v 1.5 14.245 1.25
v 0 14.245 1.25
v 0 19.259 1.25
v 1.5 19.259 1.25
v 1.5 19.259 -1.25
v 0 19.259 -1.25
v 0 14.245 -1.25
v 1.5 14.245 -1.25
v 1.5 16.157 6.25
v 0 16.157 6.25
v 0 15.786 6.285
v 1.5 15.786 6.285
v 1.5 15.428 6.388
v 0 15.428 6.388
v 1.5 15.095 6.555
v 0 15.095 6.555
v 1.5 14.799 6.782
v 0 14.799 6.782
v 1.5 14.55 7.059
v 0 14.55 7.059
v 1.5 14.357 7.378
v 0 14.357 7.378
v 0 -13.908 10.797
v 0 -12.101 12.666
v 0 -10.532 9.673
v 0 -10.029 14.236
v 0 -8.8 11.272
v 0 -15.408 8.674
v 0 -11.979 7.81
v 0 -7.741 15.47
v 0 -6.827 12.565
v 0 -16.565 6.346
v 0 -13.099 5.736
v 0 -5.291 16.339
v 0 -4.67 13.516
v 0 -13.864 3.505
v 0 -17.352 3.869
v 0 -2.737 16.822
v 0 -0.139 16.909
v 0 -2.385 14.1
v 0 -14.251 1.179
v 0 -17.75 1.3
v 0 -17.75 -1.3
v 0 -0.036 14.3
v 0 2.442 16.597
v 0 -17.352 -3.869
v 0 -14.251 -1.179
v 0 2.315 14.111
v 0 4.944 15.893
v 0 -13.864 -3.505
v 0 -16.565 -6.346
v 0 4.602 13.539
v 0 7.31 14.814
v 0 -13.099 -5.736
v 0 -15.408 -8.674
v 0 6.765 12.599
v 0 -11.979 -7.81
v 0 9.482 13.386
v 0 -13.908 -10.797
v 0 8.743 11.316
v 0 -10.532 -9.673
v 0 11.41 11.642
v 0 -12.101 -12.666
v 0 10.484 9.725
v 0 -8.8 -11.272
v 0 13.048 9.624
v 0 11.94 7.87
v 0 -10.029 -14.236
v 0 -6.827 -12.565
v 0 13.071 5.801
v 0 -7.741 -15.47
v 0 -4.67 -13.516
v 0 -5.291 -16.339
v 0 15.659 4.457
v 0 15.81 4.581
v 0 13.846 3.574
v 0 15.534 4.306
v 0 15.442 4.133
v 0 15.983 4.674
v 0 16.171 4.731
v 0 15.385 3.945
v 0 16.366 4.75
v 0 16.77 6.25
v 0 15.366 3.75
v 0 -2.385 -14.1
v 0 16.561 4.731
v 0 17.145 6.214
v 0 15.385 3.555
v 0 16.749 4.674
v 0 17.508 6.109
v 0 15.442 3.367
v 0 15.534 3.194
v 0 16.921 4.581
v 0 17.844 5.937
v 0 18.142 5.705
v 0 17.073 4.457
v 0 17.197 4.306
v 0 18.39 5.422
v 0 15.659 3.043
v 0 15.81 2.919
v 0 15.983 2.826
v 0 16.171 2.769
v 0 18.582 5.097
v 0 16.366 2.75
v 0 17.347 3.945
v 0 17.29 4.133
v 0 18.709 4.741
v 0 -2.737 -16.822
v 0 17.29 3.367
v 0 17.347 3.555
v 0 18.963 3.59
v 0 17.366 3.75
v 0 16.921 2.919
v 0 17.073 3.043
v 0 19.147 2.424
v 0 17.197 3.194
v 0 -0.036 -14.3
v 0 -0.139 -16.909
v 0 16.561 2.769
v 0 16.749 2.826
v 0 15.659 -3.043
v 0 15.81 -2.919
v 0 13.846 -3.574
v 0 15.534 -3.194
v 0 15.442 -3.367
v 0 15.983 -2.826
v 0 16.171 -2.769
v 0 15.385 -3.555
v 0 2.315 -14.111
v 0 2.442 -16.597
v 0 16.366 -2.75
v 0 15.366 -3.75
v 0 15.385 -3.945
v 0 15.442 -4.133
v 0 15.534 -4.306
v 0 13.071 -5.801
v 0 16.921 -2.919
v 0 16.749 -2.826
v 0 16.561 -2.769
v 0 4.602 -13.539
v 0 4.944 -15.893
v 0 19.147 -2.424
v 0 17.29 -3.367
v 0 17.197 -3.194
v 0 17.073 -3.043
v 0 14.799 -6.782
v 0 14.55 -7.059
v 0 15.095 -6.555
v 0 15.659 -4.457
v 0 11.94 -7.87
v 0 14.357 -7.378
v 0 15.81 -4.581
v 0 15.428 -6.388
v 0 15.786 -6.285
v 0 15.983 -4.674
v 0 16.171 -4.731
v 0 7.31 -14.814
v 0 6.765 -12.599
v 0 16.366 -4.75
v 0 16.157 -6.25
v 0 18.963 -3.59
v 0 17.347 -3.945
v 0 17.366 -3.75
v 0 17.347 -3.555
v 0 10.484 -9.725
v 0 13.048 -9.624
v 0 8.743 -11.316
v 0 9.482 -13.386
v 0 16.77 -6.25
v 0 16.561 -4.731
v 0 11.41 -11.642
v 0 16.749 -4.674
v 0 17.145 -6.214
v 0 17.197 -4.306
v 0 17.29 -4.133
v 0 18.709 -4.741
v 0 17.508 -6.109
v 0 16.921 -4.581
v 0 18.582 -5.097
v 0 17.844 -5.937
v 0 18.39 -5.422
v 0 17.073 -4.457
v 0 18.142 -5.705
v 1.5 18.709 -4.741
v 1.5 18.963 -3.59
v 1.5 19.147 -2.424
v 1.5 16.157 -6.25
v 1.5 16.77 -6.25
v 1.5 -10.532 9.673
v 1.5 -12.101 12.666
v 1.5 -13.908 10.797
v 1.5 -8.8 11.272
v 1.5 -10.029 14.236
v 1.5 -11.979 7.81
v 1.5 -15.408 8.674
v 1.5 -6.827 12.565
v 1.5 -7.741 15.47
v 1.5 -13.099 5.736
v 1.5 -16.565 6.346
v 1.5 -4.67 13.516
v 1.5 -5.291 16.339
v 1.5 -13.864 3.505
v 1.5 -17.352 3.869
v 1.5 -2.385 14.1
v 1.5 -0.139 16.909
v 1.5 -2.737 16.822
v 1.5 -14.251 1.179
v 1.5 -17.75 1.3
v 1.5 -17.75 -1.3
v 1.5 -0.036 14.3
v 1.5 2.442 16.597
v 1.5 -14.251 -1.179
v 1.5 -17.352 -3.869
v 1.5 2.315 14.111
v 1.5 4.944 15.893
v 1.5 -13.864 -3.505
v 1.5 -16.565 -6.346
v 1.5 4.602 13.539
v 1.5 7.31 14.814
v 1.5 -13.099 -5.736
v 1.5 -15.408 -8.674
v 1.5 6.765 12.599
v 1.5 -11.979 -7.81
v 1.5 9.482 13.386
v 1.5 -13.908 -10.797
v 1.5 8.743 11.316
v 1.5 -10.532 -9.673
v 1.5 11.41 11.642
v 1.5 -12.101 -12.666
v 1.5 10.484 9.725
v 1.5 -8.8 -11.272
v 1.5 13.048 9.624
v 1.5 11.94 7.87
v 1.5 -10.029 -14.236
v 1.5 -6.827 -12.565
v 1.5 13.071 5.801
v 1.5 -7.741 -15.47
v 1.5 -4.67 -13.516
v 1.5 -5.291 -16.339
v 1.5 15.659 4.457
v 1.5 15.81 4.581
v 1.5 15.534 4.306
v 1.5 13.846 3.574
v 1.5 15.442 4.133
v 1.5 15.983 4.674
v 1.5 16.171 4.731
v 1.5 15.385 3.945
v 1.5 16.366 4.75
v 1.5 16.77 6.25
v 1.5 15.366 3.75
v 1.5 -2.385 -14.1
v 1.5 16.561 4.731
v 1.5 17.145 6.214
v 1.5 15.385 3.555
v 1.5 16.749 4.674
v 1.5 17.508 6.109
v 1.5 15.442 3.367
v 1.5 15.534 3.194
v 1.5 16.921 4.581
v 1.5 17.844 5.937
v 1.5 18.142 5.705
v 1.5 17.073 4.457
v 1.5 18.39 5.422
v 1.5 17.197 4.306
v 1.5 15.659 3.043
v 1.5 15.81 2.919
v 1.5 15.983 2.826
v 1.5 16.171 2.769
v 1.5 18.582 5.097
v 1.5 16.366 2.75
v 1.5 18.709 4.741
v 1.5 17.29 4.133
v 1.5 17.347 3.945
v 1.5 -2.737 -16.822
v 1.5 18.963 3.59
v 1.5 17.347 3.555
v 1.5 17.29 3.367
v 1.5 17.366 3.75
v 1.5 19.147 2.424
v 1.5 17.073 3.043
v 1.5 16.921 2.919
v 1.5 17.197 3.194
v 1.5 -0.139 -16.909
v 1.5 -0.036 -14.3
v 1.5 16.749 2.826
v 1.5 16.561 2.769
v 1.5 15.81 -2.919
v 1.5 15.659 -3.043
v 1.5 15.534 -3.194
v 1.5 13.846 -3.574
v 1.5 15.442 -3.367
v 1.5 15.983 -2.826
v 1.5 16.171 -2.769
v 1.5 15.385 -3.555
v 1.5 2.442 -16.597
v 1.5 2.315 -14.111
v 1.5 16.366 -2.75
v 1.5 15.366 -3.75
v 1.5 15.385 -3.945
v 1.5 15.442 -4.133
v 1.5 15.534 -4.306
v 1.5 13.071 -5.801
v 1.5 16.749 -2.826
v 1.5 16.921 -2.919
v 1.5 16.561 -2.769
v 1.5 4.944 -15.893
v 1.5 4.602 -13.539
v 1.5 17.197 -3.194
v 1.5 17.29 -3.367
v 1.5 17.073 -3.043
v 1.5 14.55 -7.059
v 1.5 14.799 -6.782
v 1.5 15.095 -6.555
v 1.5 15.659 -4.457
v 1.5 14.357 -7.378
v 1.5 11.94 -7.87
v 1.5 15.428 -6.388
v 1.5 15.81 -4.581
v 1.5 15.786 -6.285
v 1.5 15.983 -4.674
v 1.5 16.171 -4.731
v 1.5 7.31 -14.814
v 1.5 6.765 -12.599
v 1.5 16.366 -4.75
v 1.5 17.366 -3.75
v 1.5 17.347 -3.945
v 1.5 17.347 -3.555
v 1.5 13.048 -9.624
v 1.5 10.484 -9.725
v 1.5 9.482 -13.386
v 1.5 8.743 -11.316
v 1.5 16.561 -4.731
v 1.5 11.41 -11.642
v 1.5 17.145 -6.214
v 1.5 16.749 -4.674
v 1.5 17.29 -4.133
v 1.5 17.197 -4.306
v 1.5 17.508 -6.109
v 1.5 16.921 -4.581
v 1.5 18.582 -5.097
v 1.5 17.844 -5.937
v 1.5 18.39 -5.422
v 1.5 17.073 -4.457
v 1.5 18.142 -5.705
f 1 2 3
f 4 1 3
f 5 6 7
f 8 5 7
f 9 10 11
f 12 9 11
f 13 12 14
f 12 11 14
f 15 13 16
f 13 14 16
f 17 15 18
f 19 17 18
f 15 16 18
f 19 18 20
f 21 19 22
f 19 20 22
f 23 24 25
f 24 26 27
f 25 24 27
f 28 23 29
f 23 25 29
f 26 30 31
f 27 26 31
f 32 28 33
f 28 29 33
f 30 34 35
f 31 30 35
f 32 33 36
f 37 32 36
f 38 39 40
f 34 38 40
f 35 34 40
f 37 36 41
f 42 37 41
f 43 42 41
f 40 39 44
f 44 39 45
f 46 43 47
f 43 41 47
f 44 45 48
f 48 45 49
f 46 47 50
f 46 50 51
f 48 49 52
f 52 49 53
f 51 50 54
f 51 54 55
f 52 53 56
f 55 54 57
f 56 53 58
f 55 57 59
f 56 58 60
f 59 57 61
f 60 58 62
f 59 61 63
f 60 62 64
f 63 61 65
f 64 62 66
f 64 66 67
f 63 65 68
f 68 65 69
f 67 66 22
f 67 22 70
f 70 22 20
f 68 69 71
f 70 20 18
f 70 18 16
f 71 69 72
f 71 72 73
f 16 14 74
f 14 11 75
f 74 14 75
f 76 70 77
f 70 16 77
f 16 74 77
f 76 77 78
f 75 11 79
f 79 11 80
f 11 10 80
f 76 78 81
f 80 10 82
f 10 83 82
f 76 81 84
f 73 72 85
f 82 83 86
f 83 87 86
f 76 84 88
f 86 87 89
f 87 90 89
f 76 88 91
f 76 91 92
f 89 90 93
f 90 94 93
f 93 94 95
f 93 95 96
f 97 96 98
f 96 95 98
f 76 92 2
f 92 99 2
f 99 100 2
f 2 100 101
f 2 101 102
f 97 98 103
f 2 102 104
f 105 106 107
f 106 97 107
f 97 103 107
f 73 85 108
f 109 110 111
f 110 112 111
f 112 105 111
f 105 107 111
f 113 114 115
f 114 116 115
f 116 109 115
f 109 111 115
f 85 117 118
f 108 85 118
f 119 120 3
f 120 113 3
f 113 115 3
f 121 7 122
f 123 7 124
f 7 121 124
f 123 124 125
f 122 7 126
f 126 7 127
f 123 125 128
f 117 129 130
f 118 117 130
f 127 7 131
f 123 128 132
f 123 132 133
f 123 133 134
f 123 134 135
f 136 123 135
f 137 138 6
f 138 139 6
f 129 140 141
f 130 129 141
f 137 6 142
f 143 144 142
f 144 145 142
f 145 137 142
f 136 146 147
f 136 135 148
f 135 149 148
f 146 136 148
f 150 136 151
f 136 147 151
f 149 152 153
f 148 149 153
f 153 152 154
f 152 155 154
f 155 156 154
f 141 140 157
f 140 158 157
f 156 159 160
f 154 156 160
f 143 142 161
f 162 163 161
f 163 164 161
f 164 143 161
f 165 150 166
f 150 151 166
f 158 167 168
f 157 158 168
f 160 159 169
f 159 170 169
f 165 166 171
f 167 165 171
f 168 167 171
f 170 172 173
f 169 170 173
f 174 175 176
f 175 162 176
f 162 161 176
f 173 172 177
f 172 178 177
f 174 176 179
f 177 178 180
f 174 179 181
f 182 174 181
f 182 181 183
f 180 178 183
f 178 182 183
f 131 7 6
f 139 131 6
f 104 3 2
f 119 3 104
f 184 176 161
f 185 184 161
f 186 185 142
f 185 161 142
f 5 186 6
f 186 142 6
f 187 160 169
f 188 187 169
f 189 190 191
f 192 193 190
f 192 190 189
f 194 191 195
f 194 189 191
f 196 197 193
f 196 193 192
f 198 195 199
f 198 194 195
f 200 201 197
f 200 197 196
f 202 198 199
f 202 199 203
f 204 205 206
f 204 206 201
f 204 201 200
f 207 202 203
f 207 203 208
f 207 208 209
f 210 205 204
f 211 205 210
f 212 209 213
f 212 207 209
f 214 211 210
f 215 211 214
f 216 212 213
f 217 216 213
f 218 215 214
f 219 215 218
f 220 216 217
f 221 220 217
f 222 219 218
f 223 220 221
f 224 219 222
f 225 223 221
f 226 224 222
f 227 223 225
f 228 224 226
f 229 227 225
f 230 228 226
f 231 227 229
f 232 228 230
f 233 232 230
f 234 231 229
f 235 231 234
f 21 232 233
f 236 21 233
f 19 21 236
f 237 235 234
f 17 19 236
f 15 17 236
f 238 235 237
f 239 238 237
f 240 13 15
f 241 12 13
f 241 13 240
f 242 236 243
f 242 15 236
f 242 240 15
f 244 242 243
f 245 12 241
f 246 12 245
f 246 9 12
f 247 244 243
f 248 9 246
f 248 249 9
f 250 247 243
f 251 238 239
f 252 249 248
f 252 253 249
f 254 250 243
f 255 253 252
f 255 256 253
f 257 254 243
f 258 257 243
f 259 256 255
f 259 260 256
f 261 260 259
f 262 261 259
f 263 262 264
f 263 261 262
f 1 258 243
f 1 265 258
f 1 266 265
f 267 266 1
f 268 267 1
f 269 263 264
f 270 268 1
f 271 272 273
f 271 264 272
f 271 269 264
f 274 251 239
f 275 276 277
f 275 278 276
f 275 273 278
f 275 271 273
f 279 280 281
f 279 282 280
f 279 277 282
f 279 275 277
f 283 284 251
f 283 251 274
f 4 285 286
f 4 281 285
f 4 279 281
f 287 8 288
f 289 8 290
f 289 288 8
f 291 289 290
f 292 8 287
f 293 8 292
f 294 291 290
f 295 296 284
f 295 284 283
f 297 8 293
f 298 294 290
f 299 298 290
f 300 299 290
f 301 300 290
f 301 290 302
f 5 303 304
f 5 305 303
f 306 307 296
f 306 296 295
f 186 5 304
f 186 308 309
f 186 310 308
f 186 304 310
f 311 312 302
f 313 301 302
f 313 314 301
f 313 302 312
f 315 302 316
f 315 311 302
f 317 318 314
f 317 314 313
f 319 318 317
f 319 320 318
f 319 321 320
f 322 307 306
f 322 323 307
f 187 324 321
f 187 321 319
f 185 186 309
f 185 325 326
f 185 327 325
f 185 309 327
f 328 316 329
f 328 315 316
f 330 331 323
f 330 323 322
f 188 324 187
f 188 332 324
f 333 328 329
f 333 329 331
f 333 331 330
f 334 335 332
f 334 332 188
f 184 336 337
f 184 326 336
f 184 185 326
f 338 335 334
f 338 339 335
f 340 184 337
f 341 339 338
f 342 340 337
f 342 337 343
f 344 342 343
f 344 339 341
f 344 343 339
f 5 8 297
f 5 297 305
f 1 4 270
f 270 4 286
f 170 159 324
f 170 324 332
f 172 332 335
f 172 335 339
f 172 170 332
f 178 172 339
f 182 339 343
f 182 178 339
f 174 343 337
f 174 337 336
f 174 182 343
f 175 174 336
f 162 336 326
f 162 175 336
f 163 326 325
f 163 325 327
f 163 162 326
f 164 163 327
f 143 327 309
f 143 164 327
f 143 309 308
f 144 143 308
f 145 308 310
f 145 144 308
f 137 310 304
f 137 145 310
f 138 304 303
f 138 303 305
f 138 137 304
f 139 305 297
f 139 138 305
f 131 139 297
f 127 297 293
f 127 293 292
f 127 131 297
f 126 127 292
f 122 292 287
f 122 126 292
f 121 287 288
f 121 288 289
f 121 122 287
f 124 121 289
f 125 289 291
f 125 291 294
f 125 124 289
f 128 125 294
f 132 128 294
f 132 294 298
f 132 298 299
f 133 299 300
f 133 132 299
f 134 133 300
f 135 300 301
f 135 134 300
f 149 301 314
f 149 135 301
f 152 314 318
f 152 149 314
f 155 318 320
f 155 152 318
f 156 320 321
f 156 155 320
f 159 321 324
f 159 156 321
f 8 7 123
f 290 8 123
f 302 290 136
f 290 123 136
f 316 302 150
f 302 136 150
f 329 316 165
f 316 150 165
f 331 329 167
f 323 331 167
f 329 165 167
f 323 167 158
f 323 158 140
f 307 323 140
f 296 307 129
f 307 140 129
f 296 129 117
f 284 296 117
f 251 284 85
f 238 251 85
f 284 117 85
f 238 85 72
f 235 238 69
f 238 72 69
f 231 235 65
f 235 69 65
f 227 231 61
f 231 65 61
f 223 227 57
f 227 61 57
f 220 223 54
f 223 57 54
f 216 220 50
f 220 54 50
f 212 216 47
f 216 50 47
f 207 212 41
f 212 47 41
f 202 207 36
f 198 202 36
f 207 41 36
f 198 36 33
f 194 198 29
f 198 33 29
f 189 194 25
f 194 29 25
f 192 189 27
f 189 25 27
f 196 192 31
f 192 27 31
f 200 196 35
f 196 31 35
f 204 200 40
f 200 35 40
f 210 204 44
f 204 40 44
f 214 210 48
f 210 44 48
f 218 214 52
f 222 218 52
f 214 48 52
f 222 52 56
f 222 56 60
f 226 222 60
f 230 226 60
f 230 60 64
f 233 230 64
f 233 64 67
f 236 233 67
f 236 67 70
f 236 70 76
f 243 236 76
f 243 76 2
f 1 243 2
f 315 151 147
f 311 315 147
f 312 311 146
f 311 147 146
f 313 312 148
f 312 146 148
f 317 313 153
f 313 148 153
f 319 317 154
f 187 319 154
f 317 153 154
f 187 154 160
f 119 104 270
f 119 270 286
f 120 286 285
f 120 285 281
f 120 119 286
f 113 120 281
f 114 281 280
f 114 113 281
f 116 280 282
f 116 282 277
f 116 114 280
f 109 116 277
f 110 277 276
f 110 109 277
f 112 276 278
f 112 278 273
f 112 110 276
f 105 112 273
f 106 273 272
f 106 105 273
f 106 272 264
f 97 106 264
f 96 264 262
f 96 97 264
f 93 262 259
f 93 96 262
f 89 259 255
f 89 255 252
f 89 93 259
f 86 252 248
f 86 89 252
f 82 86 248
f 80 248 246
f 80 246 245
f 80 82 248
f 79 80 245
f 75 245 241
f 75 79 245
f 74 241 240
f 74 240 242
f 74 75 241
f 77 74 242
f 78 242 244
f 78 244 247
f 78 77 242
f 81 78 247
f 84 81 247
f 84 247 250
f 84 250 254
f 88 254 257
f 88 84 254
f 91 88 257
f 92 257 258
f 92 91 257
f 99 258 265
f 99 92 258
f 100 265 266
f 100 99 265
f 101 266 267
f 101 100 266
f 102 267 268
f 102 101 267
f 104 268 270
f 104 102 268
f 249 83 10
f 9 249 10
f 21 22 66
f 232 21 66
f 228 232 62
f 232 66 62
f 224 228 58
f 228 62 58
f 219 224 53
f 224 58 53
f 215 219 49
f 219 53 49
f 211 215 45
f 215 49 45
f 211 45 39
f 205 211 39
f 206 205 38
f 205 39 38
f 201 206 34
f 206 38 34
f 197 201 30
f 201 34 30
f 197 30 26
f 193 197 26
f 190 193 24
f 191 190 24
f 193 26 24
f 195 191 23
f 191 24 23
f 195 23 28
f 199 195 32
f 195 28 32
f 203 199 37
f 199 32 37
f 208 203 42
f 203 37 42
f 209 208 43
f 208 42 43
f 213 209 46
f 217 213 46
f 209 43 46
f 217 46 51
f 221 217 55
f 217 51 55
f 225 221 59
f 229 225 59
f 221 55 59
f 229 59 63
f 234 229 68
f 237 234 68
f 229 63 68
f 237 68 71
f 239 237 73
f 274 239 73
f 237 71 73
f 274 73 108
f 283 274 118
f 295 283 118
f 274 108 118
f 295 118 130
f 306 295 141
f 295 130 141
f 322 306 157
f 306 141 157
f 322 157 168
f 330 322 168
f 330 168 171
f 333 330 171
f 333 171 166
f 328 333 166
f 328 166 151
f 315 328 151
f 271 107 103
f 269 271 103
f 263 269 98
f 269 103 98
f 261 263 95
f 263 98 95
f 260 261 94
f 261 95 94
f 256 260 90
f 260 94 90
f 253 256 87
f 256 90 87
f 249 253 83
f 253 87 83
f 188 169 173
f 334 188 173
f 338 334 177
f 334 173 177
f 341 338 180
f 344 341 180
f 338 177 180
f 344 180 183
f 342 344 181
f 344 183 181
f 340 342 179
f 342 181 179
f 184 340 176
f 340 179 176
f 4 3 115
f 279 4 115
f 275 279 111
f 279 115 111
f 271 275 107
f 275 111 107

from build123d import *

# Parameters (mm, degrees)
SKETCH1_R           = 1
BOSS_EXTRUDE1_DEPTH = 1.5


with BuildPart() as part:
    # Sketch1 → Boss-Extrude1 (new body)
    with BuildSketch(Plane(origin=(0, 0, 0), x_dir=(0, 0, -1), z_dir=(1, 0, 0))):
        with BuildLine():
            Line((6.25, 16.157120391), (6.25, 16.769838997))
            ThreePointArc((6.25, 16.769838997), (5.828394576, 17.99811851), (4.741329439, 18.708548718))
            ThreePointArc((4.741329439, 18.708548718), (3.008303165, 19.064105331), (1.25, 19.259478186))
            Line((1.25, 19.259478186), (1.25, 14.24526237))
            ThreePointArc((1.25, 14.24526237), (0, -14.3), (-1.25, 14.24526237))
            Line((-1.25, 14.24526237), (-1.25, 19.259478186))
            ThreePointArc((-1.25, 19.259478186), (-3.008303352, 19.064105301), (-4.741329807, 18.708548625))
            ThreePointArc((-4.741329807, 18.708548625), (-5.828394693, 17.99811836), (-6.25, 16.769838997))
            Line((-6.25, 16.769838997), (-6.25, 16.157120391))
            ThreePointArc((-6.25, 16.157120391), (-6.555342891, 15.094982319), (-7.378137284, 14.357160556))
            ThreePointArc((-7.378137284, 14.357160556), (-5.6e-08, -17.8), (7.378137384, 14.357160508))
            ThreePointArc((7.378137384, 14.357160508), (6.555342921, 15.094982271), (6.25, 16.157120391))
        make_face()
        with Locations((3.75, 16.365864345)):
            Circle(SKETCH1_R, mode=Mode.SUBTRACT)
        with Locations((-3.75, 16.365864345)):
            Circle(SKETCH1_R, mode=Mode.SUBTRACT)
    extrude(amount=BOSS_EXTRUDE1_DEPTH)


solid = part.part
